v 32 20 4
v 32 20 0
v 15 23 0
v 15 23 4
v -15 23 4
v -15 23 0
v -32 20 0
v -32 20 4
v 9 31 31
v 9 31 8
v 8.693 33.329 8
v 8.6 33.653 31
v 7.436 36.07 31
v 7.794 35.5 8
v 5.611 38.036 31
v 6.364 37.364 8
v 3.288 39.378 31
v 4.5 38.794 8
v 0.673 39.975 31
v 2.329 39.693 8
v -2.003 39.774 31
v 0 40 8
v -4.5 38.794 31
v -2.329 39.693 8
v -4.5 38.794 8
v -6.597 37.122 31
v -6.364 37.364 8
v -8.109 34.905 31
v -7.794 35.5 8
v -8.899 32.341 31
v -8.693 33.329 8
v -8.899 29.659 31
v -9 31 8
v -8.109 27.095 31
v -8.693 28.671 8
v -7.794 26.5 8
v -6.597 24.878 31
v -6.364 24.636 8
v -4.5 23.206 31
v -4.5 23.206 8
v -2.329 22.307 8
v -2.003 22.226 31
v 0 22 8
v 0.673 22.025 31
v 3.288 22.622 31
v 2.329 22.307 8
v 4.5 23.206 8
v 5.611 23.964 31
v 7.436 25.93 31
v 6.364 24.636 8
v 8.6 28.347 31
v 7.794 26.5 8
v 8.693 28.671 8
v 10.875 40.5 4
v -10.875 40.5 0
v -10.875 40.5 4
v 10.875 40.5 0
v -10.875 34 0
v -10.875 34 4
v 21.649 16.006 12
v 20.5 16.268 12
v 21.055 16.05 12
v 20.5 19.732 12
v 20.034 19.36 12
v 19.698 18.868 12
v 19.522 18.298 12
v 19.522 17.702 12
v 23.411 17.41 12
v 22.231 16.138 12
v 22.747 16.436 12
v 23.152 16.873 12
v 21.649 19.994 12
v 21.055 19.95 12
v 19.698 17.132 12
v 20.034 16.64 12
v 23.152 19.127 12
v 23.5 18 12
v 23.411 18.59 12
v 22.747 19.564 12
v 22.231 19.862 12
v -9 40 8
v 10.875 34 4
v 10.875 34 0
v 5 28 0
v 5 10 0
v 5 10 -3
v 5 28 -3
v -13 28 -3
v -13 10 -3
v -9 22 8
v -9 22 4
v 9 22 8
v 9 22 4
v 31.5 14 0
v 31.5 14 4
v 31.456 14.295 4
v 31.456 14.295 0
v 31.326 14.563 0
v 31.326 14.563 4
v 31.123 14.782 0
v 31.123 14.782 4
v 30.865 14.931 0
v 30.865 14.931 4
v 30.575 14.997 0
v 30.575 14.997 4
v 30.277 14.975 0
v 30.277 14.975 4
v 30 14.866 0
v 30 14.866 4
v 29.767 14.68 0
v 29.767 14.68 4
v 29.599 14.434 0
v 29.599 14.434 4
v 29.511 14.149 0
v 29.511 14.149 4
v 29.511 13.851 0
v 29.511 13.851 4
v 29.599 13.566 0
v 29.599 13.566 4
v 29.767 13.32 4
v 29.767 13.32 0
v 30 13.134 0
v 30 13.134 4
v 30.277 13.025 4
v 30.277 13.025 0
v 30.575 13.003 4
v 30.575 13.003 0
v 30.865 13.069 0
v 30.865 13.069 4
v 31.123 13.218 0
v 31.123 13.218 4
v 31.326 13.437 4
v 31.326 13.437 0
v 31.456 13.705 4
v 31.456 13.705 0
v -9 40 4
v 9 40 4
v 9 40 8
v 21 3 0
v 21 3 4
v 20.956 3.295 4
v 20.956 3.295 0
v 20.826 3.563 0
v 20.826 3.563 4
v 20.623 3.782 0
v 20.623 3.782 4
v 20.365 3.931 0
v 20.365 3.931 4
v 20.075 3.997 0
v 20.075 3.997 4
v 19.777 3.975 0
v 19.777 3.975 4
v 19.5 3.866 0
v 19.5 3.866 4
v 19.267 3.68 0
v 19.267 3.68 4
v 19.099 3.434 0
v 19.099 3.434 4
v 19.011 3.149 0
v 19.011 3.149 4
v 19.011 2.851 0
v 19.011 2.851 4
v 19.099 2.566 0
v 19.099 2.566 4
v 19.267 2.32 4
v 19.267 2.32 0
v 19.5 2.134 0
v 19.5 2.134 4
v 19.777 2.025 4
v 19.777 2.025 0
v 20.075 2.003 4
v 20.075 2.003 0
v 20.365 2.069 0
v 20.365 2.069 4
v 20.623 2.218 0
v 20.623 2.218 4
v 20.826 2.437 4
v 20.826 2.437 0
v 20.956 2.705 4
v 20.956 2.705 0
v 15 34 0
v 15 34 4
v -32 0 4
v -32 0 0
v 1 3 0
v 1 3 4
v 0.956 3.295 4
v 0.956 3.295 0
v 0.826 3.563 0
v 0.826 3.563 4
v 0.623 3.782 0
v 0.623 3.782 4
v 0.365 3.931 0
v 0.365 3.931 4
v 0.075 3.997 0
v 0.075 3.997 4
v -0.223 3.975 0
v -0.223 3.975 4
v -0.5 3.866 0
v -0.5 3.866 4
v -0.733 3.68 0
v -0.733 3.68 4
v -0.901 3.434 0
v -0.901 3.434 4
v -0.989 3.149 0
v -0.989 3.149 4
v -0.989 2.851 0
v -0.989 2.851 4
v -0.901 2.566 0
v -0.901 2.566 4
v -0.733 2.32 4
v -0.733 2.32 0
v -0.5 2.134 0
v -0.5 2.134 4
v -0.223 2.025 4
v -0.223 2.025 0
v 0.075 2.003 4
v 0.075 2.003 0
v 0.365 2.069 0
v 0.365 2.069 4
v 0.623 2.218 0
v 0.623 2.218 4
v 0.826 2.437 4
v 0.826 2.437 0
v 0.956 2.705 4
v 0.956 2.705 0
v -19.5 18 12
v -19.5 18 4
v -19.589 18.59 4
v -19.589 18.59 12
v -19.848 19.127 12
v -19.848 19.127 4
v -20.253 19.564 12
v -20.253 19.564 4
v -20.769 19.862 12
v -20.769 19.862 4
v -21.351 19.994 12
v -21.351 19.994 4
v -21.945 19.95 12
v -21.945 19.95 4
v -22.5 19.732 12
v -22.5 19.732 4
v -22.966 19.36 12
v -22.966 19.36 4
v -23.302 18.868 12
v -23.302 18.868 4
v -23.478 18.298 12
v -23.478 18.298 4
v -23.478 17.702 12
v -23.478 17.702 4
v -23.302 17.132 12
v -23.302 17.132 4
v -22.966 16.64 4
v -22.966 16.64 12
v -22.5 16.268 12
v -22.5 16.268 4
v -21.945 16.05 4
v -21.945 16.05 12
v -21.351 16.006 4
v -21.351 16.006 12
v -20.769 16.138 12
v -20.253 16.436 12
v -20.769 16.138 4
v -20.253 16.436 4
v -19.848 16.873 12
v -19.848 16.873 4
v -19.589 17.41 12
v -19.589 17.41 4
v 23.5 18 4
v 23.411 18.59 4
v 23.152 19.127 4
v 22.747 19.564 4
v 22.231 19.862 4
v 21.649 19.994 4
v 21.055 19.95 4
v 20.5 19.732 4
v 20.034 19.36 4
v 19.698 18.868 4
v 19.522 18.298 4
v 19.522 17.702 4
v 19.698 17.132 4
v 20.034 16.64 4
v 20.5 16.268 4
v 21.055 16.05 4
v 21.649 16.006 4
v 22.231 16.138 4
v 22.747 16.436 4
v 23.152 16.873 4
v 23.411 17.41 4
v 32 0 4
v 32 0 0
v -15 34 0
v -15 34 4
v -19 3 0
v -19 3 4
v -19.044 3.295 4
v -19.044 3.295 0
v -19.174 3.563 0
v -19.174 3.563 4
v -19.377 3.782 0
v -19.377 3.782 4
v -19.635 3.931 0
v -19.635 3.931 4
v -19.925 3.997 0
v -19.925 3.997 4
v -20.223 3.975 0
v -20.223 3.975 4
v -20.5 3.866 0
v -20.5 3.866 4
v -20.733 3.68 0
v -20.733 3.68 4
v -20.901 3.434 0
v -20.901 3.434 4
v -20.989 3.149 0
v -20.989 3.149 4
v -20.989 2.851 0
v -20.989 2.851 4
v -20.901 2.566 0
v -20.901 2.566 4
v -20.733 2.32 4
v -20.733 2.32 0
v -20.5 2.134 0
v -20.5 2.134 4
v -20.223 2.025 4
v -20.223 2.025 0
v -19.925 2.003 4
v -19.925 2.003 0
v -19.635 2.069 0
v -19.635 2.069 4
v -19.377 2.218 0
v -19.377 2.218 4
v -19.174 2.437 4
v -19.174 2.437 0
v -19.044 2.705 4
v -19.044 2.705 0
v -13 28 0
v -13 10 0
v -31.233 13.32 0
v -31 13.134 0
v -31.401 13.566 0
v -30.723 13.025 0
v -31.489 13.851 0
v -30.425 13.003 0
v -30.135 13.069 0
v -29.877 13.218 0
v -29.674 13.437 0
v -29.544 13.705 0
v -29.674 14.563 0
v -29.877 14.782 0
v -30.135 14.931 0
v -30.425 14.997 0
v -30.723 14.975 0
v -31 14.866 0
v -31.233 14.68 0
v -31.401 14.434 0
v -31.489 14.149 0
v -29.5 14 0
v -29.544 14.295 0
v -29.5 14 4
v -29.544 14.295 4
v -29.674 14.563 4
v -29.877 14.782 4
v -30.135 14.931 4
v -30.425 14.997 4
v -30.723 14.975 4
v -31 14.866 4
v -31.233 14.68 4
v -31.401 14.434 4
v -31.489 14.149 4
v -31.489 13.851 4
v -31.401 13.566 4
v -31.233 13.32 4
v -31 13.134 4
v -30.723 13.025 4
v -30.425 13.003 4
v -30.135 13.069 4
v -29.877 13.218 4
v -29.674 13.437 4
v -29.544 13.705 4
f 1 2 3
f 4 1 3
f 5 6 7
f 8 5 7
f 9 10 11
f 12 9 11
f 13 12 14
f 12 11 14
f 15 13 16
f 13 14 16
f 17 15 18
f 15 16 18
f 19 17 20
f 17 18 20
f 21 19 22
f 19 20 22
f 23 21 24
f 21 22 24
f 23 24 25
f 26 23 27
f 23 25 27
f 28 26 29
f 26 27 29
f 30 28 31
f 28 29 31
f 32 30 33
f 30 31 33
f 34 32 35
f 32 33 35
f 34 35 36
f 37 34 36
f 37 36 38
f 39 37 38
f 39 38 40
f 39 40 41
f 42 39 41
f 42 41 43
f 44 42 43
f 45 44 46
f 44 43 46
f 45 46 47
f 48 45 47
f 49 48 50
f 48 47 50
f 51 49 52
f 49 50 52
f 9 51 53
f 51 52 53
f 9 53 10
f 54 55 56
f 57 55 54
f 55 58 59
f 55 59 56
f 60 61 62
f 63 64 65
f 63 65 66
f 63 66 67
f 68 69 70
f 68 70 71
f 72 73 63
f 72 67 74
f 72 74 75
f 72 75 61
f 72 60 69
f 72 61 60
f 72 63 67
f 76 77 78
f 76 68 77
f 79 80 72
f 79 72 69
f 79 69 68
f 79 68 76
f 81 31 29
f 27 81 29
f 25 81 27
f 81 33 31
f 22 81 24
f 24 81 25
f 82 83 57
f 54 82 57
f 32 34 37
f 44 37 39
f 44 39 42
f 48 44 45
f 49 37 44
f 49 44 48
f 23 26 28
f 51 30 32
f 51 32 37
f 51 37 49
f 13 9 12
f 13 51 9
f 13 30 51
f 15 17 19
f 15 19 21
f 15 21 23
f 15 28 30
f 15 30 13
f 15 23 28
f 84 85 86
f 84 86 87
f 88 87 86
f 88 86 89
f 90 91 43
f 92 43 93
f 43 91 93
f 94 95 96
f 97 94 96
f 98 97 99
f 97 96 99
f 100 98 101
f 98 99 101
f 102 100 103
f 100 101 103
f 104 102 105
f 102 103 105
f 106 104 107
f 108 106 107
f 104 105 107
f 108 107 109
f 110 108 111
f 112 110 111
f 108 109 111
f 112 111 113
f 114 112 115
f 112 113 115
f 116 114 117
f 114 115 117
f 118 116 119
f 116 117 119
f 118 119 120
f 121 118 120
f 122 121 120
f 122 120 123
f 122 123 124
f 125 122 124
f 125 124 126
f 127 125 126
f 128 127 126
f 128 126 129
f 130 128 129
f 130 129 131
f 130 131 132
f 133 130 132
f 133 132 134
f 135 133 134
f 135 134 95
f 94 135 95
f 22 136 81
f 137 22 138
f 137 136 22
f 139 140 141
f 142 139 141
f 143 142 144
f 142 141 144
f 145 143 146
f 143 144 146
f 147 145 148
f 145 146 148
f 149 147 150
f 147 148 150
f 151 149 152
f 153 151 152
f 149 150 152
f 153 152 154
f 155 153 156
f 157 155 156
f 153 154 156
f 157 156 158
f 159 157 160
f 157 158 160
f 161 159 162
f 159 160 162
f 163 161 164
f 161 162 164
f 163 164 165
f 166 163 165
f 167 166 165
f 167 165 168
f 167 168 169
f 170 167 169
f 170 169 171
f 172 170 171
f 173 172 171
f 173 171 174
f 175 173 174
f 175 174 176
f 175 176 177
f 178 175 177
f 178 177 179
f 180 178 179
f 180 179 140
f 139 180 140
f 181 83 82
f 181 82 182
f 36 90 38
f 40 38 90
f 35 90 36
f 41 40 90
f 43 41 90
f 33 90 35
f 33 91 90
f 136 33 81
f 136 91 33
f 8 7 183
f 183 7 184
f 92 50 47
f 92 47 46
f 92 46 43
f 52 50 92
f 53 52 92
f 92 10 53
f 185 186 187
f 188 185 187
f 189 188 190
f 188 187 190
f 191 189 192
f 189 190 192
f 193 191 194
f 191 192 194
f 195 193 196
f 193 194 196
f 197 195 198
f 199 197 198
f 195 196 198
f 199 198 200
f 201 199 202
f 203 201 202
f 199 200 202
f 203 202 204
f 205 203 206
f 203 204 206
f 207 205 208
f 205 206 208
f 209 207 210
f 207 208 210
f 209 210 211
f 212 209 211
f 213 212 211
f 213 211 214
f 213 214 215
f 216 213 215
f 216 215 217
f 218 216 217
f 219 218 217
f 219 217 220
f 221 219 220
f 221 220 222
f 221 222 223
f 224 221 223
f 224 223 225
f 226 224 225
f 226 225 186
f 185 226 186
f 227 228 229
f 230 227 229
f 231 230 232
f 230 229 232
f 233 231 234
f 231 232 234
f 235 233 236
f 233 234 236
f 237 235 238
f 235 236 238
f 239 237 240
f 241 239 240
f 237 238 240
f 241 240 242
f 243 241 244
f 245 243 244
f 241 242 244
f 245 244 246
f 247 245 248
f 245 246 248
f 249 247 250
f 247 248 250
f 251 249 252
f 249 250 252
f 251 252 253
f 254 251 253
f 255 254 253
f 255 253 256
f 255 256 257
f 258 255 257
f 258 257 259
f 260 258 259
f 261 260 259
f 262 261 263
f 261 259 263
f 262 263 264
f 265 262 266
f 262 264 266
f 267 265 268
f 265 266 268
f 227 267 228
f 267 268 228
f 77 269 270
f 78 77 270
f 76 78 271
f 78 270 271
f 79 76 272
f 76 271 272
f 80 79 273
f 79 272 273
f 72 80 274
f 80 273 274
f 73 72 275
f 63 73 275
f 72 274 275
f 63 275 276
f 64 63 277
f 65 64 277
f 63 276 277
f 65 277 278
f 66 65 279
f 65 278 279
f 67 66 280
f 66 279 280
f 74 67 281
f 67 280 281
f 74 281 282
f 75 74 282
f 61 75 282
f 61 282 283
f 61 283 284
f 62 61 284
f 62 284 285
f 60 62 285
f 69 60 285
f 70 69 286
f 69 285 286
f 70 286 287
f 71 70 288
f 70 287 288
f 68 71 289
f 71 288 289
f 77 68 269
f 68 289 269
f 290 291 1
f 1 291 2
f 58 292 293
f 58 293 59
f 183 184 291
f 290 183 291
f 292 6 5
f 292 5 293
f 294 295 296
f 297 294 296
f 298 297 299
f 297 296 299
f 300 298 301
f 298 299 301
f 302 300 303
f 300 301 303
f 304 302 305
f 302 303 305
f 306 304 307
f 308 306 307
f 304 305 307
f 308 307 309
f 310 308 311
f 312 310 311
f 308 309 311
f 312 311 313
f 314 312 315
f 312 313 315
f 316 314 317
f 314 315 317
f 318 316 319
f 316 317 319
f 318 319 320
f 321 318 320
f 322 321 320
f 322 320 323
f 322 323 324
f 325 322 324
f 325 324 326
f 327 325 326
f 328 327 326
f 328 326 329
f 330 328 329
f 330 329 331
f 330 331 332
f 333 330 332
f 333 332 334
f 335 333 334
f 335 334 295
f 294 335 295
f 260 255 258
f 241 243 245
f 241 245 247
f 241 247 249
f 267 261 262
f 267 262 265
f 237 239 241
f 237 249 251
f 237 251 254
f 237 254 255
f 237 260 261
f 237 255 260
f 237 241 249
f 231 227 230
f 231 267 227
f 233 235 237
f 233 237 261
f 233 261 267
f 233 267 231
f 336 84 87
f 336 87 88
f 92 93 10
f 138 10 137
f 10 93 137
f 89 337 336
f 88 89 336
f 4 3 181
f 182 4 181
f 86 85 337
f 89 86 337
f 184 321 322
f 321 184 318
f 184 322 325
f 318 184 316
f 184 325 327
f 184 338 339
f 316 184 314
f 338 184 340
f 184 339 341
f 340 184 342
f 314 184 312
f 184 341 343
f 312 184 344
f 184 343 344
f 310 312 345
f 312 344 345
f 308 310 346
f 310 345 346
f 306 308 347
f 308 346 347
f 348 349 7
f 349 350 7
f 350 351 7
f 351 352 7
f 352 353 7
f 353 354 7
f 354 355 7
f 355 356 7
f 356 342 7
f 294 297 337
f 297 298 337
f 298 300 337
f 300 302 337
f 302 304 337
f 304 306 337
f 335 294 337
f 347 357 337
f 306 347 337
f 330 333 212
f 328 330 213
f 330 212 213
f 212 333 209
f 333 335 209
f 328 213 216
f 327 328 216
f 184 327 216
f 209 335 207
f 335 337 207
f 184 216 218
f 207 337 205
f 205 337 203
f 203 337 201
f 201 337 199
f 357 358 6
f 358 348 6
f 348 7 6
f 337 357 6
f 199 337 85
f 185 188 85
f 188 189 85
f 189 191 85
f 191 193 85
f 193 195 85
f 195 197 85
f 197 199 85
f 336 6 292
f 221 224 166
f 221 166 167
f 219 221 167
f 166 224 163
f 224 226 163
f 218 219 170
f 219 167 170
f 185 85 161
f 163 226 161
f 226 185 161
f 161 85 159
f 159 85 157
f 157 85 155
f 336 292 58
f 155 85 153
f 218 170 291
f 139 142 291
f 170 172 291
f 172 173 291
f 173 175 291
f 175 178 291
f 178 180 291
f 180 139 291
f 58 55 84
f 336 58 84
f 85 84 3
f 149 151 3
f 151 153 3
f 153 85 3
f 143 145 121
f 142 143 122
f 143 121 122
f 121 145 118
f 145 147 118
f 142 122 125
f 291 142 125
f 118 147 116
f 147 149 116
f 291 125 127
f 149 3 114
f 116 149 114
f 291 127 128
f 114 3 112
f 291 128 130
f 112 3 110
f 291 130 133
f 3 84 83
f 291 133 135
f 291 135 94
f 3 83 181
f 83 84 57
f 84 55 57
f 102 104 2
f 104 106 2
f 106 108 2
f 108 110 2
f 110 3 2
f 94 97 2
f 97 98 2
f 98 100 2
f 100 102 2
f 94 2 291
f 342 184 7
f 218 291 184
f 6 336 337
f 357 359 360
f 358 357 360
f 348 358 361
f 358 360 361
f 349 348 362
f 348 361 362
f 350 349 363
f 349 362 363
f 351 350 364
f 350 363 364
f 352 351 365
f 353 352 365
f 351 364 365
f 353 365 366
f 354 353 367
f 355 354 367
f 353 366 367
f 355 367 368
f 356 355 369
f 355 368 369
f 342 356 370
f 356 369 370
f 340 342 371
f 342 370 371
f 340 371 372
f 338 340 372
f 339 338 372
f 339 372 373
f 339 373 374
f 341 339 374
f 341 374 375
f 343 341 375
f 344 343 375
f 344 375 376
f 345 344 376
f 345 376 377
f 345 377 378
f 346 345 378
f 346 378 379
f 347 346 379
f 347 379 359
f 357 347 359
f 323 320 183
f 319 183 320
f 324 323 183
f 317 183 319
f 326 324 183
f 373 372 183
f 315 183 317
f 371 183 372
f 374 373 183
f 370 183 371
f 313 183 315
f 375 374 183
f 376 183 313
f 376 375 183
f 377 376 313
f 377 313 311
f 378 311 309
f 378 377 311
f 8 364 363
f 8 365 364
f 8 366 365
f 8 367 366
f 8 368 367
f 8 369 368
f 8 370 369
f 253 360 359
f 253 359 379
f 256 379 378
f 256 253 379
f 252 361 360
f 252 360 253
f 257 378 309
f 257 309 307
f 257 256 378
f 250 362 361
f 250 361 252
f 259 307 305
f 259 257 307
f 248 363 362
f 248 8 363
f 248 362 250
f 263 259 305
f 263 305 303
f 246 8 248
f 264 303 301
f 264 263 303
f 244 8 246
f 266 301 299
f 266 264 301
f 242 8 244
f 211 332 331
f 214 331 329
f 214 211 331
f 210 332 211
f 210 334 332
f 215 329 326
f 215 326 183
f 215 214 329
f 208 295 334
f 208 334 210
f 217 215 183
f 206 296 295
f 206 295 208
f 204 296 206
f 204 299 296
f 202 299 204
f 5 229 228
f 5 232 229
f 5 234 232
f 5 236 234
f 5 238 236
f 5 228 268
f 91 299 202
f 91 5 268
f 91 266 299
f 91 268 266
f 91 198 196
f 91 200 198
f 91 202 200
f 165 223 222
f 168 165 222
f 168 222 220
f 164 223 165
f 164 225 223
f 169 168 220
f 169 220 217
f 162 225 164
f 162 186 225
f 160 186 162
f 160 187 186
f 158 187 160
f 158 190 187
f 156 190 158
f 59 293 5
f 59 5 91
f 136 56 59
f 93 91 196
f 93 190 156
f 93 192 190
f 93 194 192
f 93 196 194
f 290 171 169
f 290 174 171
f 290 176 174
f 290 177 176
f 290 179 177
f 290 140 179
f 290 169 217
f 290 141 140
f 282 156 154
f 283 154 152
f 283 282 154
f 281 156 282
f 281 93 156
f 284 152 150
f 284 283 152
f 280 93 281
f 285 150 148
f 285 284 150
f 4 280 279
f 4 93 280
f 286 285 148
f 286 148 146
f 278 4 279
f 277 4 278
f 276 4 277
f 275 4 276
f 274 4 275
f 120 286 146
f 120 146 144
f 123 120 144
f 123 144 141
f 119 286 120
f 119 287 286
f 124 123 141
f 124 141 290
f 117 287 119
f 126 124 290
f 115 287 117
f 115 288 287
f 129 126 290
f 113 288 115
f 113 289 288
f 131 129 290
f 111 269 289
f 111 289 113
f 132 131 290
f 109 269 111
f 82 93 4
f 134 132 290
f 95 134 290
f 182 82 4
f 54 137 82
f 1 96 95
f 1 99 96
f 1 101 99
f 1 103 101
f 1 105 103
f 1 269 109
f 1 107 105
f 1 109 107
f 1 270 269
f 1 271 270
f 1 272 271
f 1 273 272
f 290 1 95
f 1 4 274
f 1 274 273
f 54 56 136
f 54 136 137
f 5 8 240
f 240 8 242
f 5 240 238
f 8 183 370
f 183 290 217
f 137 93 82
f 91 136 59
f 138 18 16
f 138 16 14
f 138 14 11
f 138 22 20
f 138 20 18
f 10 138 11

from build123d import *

# Parameters (mm, degrees)
SKETCH1_W           = 30
SKETCH1_H           = 11
SKETCH1_W_2         = 21.75
SKETCH1_H_2         = 6.5
BOSS_EXTRUDE1_DEPTH = 4
SKETCH2_R           = 1
CUT_EXTRUDE1_DEPTH  = 5
SKETCH3_R           = 9
BOSS_EXTRUDE2_DEPTH = 27
SKETCH5_W           = 18
SKETCH5_H           = 18
BOSS_EXTRUDE3_DEPTH = 3
SKETCH6_R           = 2
BOSS_EXTRUDE4_DEPTH = 8
SKETCH7_W           = 18
SKETCH7_H           = 18
BOSS_EXTRUDE5_DEPTH = 4


with BuildPart() as part:
    # Sketch1 → Boss-Extrude1 (new body)
    with BuildSketch(Plane.XY):
        Polygon((32, 0), (32, 20), (15, 23), (-15, 23), (-32, 20), (-32, 0), align=None)
        with Locations((0, 28.5)):
            Rectangle(SKETCH1_W, SKETCH1_H)
        with Locations((0, 37.25)):
            Rectangle(SKETCH1_W_2, SKETCH1_H_2)
    extrude(amount=BOSS_EXTRUDE1_DEPTH)

    # Sketch2 → Cut-Extrude1 (cut)
    with BuildSketch(Plane.XY.offset(4)):
        with Locations((20, 3)):
            Circle(SKETCH2_R)
        with Locations((0, 3)):
            Circle(SKETCH2_R)
        with Locations((-20, 3)):
            Circle(SKETCH2_R)
        with Locations((-30.5, 14)):
            Circle(SKETCH2_R)
        with Locations((30.5, 14)):
            Circle(SKETCH2_R)
    extrude(amount=-CUT_EXTRUDE1_DEPTH, mode=Mode.SUBTRACT)

    # Sketch3 → Boss-Extrude2 (add)
    with BuildSketch(Plane.XY.offset(4)):
        with Locations((0, 31)):
            Circle(SKETCH3_R)
    extrude(amount=BOSS_EXTRUDE2_DEPTH)

    # Sketch5 → Boss-Extrude3 (add)
    with BuildSketch(Plane(origin=(0, 0, 0), x_dir=(-1, 0, 0), z_dir=(0, 0, -1))):
        with Locations((4, 19)):
            Rectangle(SKETCH5_W, SKETCH5_H)
    extrude(amount=BOSS_EXTRUDE3_DEPTH)

    # Sketch6 → Boss-Extrude4 (add)
    with BuildSketch(Plane.XY.offset(4)):
        with Locations((21.5, 18)):
            Circle(SKETCH6_R)
        with Locations((-21.5, 18)):
            Circle(SKETCH6_R)
    extrude(amount=BOSS_EXTRUDE4_DEPTH)

    # Sketch7 → Boss-Extrude5 (add)
    with BuildSketch(Plane.XY.offset(4)):
        with Locations((0, 31)):
            Rectangle(SKETCH7_W, SKETCH7_H)
    extrude(amount=BOSS_EXTRUDE5_DEPTH)


solid = part.part
